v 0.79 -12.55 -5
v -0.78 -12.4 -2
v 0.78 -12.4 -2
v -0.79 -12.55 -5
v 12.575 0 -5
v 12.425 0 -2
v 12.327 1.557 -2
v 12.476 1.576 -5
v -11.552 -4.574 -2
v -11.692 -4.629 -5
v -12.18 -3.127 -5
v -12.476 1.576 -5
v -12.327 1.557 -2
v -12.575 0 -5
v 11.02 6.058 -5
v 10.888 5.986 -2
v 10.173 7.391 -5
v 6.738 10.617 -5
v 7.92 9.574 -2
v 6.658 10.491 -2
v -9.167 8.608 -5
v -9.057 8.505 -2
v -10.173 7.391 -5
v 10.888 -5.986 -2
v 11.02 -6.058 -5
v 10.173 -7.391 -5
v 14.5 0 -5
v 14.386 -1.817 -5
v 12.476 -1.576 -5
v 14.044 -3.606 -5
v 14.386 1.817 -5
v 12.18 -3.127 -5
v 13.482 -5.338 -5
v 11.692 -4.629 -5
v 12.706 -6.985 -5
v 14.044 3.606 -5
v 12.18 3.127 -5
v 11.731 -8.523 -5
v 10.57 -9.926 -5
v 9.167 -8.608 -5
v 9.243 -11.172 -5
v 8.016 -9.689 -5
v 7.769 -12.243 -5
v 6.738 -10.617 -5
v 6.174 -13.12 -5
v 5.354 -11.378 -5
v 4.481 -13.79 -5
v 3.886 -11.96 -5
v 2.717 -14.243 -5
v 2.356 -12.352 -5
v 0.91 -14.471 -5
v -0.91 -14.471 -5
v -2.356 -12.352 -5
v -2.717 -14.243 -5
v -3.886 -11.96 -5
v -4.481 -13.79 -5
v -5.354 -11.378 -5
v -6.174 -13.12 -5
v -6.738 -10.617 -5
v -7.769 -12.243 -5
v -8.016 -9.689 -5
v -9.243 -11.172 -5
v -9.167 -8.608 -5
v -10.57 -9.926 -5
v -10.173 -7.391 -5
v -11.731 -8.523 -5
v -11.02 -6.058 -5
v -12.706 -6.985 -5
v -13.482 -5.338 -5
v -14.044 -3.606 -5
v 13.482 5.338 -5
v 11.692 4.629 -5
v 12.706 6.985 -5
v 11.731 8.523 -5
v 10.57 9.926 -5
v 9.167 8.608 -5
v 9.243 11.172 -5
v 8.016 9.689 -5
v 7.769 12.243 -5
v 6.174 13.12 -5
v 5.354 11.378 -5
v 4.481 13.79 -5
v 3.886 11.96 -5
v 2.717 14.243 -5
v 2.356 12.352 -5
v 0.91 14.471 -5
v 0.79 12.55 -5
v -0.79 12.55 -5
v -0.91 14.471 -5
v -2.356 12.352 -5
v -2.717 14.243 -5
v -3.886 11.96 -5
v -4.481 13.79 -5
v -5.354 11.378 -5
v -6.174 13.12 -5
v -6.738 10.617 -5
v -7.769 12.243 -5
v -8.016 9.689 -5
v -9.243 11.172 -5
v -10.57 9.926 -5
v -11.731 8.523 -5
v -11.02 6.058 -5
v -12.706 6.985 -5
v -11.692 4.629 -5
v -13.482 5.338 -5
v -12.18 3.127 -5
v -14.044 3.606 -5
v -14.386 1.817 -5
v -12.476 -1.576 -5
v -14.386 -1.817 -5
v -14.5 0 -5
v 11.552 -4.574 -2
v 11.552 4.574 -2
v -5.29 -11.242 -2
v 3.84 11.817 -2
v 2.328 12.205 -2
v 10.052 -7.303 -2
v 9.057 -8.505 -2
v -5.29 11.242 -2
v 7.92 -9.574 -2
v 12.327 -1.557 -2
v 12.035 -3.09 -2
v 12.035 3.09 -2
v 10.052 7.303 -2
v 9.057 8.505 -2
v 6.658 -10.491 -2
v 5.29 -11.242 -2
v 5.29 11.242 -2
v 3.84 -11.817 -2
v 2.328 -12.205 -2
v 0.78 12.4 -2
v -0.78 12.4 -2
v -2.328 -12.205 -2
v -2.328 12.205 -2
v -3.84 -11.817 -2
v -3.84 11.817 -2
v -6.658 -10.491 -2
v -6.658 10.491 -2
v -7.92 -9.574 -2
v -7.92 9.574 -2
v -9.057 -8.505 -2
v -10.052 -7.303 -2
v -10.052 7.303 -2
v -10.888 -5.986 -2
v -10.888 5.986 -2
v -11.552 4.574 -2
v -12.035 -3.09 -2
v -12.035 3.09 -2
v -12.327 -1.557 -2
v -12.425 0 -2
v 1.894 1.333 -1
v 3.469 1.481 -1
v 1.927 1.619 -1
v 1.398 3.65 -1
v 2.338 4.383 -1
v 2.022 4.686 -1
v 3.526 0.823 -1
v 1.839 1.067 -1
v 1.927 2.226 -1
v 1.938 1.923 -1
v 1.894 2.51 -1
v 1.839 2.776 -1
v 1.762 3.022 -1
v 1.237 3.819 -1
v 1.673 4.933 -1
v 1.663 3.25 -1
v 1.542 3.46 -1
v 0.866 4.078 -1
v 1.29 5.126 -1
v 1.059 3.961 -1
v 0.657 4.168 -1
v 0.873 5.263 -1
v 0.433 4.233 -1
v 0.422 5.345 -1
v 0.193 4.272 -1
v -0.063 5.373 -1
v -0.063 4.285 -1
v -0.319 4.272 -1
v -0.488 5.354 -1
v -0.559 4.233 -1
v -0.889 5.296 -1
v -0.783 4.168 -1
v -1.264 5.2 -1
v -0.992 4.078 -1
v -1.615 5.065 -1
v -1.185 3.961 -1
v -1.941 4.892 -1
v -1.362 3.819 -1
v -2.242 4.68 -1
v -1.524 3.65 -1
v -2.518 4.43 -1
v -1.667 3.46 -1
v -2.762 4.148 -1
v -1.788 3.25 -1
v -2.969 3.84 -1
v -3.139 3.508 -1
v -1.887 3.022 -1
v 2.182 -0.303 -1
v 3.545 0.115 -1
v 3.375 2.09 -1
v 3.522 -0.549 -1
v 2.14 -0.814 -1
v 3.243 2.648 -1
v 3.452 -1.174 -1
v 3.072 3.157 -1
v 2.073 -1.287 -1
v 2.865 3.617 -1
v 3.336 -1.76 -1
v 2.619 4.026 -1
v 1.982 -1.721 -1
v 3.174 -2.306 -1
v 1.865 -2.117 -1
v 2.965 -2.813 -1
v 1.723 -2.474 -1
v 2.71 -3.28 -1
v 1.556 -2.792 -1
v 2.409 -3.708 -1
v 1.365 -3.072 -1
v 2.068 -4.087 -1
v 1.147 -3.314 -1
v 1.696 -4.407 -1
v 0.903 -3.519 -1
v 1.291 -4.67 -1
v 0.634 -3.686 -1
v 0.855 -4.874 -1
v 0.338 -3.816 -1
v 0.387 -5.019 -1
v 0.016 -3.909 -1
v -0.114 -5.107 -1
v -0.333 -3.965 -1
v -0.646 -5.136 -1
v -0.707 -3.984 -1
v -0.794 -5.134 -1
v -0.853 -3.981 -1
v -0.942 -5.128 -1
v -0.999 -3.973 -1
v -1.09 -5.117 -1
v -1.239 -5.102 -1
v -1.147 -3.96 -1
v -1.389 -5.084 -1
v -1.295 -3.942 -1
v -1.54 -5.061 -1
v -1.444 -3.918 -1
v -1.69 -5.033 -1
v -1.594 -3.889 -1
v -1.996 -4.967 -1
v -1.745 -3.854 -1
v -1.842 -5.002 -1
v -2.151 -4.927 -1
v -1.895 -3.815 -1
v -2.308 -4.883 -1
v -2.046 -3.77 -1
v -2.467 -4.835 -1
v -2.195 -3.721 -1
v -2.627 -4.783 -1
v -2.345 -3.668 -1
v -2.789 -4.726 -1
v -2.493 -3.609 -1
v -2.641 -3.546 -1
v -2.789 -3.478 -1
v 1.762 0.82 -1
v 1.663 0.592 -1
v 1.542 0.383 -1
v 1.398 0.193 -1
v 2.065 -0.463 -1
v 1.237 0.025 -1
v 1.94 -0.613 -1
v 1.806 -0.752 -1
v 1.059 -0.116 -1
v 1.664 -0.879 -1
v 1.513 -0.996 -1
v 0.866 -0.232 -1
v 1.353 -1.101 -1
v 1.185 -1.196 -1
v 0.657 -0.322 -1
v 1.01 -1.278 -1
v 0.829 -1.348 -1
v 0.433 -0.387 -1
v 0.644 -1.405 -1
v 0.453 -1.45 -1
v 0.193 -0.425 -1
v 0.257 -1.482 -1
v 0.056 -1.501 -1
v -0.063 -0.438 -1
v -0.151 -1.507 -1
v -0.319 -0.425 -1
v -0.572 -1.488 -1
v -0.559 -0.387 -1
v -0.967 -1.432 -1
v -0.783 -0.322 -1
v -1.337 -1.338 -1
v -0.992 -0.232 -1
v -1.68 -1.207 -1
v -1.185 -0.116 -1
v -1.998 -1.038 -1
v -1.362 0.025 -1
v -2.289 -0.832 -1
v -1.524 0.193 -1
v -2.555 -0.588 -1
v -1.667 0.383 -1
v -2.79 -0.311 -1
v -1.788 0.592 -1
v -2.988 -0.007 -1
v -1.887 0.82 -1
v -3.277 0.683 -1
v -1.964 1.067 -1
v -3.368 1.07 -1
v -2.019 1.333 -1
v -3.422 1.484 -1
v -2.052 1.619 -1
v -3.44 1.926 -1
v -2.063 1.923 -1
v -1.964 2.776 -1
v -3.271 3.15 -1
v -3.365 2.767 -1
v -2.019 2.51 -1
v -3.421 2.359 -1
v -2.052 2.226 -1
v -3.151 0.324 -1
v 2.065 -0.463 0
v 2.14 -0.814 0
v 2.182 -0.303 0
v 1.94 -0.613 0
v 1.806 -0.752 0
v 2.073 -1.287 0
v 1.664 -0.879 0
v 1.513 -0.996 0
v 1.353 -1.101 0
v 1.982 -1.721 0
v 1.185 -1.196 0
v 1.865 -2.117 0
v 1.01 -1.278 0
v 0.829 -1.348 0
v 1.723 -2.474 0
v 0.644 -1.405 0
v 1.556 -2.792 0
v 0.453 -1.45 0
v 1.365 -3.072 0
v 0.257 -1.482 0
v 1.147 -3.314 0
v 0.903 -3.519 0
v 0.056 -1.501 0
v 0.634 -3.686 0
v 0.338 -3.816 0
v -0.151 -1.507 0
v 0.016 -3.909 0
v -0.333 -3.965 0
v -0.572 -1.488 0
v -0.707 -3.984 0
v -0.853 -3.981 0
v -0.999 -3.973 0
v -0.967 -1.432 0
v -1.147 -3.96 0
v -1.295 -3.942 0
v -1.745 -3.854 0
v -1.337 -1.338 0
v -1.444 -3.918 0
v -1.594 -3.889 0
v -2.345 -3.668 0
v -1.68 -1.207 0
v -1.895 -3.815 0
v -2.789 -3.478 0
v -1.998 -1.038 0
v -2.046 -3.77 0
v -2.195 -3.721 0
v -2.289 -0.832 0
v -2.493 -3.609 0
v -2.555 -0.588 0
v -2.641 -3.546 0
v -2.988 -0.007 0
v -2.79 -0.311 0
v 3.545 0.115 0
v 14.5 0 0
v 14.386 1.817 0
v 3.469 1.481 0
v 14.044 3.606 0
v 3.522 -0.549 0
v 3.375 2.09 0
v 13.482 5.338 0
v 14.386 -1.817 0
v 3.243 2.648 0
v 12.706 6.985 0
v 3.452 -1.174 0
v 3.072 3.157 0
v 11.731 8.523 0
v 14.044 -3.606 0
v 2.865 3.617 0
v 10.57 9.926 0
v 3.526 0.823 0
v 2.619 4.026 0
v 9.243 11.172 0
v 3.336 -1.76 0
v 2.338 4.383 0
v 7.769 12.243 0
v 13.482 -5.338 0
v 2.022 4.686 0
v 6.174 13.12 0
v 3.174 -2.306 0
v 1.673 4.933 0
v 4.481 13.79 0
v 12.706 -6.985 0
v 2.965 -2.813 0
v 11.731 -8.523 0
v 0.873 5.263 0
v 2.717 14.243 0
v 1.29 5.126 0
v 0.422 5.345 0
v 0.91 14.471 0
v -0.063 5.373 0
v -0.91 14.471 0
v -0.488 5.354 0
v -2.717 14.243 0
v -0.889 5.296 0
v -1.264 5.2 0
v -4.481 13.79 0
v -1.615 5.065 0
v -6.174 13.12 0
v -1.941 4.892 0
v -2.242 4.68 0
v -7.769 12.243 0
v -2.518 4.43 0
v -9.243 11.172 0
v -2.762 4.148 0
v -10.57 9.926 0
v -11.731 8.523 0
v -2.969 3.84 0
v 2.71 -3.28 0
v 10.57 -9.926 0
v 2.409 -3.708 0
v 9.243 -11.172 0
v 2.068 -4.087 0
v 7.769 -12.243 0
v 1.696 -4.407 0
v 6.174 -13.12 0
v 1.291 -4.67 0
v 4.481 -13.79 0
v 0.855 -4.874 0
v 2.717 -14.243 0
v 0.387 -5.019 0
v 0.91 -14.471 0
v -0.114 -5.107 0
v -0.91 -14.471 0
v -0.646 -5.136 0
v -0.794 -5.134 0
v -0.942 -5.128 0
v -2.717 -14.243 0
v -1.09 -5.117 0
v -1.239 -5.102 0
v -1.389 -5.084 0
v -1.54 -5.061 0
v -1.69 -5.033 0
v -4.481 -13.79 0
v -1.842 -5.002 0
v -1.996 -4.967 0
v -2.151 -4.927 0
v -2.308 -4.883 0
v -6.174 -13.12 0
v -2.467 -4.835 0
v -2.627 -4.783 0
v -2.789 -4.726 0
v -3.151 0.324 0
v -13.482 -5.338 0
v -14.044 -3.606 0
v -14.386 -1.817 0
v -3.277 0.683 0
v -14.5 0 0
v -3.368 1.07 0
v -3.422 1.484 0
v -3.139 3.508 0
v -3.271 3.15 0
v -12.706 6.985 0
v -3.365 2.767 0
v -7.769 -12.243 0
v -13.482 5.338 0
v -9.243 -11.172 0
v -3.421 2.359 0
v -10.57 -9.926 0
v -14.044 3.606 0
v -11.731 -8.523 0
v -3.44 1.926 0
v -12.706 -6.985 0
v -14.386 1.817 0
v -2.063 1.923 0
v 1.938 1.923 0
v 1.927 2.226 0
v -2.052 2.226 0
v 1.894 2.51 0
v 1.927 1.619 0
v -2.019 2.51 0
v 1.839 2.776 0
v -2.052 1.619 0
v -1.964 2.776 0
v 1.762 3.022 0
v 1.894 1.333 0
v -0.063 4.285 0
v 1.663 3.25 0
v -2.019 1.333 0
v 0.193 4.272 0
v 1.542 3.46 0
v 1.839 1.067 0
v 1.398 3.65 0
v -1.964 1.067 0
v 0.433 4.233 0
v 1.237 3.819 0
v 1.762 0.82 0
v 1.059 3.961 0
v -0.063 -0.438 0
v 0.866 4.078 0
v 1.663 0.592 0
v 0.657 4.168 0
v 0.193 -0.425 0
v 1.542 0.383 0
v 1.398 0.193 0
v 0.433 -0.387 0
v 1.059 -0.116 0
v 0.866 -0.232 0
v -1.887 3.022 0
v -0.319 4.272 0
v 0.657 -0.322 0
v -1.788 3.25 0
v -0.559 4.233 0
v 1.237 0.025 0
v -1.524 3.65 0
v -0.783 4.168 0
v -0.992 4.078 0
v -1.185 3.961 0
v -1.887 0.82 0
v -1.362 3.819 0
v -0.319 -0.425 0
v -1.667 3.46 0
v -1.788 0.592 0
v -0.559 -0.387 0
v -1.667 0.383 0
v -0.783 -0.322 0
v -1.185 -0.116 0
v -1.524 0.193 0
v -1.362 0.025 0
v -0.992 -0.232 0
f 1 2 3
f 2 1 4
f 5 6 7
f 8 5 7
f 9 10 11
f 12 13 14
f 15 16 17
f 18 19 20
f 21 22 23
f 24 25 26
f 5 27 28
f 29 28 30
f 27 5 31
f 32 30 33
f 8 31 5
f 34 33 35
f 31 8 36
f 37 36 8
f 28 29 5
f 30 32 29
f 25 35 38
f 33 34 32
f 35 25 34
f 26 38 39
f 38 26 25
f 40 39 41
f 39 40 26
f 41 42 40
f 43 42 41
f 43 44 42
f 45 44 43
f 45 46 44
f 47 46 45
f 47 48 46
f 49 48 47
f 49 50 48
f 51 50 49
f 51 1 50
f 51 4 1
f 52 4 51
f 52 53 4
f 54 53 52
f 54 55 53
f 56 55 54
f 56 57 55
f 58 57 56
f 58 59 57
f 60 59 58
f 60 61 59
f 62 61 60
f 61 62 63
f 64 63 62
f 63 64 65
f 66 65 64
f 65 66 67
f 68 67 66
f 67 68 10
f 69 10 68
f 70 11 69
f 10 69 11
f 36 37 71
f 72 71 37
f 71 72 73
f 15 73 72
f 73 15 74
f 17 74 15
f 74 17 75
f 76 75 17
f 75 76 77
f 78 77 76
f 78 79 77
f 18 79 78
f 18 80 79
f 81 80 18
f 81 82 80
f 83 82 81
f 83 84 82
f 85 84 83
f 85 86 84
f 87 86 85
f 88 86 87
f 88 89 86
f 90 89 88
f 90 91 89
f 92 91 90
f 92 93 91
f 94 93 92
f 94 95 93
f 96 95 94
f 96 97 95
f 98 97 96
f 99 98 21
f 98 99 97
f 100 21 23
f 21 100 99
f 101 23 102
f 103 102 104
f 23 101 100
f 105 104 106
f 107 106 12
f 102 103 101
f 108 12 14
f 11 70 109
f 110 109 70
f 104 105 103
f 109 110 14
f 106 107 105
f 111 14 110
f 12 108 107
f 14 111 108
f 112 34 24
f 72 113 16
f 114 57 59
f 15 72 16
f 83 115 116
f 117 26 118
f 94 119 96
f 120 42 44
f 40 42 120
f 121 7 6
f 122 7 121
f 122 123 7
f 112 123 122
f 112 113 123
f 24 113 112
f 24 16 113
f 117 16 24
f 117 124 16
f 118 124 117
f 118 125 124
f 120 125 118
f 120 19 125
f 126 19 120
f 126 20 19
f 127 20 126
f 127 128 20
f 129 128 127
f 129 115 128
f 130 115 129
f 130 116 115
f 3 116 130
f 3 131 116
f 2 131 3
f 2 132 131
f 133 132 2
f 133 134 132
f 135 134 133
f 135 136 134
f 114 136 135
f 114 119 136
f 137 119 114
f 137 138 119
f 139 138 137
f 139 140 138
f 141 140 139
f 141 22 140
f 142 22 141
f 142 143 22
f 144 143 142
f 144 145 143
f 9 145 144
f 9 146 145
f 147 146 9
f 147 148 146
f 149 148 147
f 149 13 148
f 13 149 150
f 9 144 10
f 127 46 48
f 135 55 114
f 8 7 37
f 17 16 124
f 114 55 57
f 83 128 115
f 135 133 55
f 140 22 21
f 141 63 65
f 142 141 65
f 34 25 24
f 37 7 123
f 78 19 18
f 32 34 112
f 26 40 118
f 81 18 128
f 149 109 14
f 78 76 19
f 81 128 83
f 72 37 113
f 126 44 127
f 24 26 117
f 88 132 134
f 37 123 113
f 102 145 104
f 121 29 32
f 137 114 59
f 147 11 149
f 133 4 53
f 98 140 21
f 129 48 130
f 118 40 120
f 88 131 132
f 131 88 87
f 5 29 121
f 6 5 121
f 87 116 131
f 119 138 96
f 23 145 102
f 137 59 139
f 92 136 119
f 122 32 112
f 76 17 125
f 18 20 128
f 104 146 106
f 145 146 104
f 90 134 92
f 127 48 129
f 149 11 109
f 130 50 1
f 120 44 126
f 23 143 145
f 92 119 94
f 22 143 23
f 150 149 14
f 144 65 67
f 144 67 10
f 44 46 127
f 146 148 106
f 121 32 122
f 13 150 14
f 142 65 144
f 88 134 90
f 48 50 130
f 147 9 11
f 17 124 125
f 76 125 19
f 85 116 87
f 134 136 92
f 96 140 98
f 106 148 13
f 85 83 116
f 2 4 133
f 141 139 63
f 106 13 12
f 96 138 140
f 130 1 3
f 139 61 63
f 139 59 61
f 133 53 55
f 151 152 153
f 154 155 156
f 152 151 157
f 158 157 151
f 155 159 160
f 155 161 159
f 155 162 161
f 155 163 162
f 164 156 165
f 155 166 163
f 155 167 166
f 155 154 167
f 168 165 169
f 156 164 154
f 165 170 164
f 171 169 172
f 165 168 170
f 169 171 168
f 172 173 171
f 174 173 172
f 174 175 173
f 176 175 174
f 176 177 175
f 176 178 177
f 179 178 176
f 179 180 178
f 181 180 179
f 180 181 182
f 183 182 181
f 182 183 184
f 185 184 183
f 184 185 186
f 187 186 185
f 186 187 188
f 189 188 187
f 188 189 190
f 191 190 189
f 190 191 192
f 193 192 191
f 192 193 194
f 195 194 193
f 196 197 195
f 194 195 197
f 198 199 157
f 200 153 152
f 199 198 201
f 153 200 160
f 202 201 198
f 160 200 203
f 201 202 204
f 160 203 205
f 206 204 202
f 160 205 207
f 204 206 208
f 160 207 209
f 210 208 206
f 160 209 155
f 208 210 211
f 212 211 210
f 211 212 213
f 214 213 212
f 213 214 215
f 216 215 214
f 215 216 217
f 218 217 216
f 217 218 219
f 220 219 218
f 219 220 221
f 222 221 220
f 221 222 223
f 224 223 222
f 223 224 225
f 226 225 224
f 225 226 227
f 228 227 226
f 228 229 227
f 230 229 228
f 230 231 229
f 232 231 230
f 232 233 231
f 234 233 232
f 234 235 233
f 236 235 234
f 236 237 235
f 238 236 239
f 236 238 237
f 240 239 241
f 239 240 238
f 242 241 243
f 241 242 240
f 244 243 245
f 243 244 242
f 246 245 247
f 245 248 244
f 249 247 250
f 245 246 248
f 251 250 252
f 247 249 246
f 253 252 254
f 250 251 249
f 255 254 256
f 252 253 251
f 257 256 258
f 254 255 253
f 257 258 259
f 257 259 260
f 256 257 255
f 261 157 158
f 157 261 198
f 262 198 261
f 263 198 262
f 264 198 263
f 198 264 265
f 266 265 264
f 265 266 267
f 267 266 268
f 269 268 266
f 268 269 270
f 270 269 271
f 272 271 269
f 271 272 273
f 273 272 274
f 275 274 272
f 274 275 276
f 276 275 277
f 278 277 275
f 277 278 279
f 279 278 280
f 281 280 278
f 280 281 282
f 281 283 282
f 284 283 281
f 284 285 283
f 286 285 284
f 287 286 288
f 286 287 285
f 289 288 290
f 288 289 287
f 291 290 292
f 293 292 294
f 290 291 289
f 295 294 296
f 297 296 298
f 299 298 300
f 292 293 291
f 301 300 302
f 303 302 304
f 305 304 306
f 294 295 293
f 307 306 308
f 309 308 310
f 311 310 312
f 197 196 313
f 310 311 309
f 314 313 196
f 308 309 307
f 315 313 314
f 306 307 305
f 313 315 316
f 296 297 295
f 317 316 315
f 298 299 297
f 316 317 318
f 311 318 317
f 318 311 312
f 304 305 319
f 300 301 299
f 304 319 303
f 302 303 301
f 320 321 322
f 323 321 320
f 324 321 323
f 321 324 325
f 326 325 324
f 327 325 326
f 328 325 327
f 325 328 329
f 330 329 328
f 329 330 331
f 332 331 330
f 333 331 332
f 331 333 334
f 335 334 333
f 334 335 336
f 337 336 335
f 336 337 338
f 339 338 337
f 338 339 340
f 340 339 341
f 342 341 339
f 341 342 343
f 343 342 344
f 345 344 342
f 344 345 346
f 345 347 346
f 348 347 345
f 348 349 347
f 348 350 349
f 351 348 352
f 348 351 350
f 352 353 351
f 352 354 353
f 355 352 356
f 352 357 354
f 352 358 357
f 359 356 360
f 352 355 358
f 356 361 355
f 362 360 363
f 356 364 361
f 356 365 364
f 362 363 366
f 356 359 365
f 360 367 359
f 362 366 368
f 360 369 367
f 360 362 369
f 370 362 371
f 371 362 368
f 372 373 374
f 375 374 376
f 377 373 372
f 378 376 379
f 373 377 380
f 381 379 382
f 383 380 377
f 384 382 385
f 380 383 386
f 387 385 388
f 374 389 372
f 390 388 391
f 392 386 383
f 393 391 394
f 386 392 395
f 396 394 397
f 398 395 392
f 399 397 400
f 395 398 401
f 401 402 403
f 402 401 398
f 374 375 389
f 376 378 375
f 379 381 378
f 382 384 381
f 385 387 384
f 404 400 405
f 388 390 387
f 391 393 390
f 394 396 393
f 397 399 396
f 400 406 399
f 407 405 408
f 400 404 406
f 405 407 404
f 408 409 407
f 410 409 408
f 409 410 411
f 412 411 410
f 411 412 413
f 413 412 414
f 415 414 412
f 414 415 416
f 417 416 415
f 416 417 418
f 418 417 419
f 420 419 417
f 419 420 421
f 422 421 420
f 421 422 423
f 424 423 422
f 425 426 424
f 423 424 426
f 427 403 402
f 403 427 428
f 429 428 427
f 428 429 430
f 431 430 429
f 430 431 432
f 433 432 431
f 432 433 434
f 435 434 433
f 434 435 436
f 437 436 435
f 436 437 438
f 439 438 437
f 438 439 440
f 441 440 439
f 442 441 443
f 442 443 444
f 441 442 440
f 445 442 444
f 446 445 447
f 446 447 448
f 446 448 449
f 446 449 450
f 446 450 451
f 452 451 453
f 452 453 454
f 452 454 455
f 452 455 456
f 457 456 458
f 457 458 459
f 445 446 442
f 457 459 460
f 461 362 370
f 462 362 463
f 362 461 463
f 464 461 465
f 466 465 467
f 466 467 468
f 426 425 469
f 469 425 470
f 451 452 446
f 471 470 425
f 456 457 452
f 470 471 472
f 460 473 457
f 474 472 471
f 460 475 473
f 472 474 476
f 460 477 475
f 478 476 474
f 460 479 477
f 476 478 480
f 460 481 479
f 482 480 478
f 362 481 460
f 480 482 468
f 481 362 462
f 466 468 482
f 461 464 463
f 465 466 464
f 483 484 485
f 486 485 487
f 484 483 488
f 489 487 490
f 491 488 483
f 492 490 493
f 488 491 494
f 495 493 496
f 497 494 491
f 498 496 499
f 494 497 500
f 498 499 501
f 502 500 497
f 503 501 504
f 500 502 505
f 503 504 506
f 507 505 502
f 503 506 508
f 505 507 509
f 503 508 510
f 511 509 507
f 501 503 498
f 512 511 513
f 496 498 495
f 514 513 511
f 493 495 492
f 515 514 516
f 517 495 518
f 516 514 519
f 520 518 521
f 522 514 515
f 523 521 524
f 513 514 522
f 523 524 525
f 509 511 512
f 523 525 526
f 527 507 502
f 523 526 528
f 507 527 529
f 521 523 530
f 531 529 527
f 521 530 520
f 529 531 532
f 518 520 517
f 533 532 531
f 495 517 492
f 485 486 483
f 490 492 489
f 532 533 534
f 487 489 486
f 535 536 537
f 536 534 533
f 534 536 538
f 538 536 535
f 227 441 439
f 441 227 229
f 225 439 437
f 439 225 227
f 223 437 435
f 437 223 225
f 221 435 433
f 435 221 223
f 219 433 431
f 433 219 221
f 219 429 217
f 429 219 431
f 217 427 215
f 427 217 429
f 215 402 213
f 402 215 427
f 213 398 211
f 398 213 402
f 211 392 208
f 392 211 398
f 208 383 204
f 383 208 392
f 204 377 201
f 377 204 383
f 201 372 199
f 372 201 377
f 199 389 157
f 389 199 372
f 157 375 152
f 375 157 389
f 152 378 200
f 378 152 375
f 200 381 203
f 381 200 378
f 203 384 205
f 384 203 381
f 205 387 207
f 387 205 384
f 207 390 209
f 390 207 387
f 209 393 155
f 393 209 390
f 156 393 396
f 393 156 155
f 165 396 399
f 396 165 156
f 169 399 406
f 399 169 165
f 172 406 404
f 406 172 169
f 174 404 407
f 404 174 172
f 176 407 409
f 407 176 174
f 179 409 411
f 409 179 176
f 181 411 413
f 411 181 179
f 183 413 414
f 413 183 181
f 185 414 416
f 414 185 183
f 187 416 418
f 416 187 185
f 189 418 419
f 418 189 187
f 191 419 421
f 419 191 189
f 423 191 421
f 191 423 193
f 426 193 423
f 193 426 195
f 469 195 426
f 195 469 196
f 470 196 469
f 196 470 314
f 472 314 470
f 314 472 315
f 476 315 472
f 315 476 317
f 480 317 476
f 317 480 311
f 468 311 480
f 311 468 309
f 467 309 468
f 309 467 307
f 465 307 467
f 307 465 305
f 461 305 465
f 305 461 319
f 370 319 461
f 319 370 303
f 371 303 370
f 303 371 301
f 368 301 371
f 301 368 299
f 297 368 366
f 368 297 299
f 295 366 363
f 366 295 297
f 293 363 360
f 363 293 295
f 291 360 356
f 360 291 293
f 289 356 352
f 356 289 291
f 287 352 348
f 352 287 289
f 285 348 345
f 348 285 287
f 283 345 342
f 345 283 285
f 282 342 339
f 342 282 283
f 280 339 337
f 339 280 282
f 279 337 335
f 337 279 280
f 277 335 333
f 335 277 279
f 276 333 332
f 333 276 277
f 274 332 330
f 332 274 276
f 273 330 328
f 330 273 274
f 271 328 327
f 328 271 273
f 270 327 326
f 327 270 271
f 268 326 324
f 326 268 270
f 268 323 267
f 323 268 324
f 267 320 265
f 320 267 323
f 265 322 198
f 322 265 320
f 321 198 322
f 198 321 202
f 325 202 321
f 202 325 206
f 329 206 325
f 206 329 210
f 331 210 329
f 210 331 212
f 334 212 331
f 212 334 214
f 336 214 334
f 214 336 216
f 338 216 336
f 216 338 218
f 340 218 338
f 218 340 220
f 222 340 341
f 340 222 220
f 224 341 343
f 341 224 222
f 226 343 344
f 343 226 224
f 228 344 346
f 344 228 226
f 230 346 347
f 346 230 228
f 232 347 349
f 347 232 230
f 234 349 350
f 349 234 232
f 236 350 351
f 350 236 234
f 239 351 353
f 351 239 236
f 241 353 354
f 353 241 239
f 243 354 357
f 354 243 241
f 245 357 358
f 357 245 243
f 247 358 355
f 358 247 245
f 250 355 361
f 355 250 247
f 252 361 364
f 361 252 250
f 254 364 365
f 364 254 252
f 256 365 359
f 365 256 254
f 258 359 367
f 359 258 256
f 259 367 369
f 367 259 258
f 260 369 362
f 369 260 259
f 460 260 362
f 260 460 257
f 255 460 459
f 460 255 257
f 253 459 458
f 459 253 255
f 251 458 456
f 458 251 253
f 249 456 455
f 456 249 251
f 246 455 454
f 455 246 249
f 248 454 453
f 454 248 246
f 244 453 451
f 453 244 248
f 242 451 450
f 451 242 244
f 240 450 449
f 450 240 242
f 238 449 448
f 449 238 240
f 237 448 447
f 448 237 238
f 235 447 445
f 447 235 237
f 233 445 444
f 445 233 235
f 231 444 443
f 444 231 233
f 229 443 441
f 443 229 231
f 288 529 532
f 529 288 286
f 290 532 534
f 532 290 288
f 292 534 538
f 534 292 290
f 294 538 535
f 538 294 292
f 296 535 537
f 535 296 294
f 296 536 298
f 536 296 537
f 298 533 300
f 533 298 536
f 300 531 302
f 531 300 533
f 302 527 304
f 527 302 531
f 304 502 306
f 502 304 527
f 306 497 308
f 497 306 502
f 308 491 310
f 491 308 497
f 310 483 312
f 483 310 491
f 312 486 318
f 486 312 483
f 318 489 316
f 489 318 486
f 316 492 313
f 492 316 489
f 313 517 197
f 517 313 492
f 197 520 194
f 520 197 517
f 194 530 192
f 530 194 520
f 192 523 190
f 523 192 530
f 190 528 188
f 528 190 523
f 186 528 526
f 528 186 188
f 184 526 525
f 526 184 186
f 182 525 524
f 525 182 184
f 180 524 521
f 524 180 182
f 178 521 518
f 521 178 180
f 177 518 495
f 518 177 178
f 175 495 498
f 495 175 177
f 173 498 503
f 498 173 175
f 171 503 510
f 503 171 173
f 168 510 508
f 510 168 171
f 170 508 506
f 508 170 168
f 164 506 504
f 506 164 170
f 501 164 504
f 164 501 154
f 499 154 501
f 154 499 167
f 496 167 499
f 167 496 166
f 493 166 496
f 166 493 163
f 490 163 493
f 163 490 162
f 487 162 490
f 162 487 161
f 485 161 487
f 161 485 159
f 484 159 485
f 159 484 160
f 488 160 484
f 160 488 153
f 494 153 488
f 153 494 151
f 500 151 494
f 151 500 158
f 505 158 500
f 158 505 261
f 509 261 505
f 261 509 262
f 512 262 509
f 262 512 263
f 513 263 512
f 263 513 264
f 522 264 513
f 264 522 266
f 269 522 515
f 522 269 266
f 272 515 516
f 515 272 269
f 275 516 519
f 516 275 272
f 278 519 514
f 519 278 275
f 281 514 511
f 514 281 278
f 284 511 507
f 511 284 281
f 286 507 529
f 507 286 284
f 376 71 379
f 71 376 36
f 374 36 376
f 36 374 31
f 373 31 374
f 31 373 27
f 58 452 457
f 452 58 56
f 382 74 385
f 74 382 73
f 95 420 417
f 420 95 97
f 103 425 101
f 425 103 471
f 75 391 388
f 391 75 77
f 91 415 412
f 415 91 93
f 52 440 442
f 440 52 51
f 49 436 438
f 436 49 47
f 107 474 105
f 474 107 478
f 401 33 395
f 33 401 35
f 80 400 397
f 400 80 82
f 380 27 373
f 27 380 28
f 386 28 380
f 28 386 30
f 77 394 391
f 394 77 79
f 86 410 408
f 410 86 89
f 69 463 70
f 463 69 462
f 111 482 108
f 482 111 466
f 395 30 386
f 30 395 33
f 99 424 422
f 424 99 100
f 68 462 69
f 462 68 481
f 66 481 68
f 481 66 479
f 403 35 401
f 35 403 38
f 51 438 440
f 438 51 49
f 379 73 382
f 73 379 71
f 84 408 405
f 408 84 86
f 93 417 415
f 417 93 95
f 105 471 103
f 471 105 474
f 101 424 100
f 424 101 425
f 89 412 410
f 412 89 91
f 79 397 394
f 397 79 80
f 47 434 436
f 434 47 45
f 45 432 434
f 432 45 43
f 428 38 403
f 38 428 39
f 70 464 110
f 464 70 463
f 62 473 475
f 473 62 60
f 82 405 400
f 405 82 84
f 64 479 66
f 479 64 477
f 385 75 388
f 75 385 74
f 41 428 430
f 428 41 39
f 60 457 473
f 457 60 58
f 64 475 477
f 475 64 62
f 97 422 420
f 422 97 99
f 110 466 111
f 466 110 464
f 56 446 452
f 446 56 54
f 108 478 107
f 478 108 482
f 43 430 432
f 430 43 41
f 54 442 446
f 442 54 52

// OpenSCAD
$fn = 50;


difference() {
	union() {
		translate(v = [0, 0, -5.0000000000]) {
			cylinder(h = 5, r = 14.5000000000);
		}
	}
	union() {
		#translate(v = [0, 0, -5.0000000000]) {
			cylinder(h = 3, r1 = 12.5750000000, r2 = 12.4250000000);
		}
		translate(v = [0, 0, -1]) {
			linear_extrude(height = 1) {
				text(font = "Impact", halign = "center", size = 10, text = "9", valign = "center");
			}
		}
	}
}
